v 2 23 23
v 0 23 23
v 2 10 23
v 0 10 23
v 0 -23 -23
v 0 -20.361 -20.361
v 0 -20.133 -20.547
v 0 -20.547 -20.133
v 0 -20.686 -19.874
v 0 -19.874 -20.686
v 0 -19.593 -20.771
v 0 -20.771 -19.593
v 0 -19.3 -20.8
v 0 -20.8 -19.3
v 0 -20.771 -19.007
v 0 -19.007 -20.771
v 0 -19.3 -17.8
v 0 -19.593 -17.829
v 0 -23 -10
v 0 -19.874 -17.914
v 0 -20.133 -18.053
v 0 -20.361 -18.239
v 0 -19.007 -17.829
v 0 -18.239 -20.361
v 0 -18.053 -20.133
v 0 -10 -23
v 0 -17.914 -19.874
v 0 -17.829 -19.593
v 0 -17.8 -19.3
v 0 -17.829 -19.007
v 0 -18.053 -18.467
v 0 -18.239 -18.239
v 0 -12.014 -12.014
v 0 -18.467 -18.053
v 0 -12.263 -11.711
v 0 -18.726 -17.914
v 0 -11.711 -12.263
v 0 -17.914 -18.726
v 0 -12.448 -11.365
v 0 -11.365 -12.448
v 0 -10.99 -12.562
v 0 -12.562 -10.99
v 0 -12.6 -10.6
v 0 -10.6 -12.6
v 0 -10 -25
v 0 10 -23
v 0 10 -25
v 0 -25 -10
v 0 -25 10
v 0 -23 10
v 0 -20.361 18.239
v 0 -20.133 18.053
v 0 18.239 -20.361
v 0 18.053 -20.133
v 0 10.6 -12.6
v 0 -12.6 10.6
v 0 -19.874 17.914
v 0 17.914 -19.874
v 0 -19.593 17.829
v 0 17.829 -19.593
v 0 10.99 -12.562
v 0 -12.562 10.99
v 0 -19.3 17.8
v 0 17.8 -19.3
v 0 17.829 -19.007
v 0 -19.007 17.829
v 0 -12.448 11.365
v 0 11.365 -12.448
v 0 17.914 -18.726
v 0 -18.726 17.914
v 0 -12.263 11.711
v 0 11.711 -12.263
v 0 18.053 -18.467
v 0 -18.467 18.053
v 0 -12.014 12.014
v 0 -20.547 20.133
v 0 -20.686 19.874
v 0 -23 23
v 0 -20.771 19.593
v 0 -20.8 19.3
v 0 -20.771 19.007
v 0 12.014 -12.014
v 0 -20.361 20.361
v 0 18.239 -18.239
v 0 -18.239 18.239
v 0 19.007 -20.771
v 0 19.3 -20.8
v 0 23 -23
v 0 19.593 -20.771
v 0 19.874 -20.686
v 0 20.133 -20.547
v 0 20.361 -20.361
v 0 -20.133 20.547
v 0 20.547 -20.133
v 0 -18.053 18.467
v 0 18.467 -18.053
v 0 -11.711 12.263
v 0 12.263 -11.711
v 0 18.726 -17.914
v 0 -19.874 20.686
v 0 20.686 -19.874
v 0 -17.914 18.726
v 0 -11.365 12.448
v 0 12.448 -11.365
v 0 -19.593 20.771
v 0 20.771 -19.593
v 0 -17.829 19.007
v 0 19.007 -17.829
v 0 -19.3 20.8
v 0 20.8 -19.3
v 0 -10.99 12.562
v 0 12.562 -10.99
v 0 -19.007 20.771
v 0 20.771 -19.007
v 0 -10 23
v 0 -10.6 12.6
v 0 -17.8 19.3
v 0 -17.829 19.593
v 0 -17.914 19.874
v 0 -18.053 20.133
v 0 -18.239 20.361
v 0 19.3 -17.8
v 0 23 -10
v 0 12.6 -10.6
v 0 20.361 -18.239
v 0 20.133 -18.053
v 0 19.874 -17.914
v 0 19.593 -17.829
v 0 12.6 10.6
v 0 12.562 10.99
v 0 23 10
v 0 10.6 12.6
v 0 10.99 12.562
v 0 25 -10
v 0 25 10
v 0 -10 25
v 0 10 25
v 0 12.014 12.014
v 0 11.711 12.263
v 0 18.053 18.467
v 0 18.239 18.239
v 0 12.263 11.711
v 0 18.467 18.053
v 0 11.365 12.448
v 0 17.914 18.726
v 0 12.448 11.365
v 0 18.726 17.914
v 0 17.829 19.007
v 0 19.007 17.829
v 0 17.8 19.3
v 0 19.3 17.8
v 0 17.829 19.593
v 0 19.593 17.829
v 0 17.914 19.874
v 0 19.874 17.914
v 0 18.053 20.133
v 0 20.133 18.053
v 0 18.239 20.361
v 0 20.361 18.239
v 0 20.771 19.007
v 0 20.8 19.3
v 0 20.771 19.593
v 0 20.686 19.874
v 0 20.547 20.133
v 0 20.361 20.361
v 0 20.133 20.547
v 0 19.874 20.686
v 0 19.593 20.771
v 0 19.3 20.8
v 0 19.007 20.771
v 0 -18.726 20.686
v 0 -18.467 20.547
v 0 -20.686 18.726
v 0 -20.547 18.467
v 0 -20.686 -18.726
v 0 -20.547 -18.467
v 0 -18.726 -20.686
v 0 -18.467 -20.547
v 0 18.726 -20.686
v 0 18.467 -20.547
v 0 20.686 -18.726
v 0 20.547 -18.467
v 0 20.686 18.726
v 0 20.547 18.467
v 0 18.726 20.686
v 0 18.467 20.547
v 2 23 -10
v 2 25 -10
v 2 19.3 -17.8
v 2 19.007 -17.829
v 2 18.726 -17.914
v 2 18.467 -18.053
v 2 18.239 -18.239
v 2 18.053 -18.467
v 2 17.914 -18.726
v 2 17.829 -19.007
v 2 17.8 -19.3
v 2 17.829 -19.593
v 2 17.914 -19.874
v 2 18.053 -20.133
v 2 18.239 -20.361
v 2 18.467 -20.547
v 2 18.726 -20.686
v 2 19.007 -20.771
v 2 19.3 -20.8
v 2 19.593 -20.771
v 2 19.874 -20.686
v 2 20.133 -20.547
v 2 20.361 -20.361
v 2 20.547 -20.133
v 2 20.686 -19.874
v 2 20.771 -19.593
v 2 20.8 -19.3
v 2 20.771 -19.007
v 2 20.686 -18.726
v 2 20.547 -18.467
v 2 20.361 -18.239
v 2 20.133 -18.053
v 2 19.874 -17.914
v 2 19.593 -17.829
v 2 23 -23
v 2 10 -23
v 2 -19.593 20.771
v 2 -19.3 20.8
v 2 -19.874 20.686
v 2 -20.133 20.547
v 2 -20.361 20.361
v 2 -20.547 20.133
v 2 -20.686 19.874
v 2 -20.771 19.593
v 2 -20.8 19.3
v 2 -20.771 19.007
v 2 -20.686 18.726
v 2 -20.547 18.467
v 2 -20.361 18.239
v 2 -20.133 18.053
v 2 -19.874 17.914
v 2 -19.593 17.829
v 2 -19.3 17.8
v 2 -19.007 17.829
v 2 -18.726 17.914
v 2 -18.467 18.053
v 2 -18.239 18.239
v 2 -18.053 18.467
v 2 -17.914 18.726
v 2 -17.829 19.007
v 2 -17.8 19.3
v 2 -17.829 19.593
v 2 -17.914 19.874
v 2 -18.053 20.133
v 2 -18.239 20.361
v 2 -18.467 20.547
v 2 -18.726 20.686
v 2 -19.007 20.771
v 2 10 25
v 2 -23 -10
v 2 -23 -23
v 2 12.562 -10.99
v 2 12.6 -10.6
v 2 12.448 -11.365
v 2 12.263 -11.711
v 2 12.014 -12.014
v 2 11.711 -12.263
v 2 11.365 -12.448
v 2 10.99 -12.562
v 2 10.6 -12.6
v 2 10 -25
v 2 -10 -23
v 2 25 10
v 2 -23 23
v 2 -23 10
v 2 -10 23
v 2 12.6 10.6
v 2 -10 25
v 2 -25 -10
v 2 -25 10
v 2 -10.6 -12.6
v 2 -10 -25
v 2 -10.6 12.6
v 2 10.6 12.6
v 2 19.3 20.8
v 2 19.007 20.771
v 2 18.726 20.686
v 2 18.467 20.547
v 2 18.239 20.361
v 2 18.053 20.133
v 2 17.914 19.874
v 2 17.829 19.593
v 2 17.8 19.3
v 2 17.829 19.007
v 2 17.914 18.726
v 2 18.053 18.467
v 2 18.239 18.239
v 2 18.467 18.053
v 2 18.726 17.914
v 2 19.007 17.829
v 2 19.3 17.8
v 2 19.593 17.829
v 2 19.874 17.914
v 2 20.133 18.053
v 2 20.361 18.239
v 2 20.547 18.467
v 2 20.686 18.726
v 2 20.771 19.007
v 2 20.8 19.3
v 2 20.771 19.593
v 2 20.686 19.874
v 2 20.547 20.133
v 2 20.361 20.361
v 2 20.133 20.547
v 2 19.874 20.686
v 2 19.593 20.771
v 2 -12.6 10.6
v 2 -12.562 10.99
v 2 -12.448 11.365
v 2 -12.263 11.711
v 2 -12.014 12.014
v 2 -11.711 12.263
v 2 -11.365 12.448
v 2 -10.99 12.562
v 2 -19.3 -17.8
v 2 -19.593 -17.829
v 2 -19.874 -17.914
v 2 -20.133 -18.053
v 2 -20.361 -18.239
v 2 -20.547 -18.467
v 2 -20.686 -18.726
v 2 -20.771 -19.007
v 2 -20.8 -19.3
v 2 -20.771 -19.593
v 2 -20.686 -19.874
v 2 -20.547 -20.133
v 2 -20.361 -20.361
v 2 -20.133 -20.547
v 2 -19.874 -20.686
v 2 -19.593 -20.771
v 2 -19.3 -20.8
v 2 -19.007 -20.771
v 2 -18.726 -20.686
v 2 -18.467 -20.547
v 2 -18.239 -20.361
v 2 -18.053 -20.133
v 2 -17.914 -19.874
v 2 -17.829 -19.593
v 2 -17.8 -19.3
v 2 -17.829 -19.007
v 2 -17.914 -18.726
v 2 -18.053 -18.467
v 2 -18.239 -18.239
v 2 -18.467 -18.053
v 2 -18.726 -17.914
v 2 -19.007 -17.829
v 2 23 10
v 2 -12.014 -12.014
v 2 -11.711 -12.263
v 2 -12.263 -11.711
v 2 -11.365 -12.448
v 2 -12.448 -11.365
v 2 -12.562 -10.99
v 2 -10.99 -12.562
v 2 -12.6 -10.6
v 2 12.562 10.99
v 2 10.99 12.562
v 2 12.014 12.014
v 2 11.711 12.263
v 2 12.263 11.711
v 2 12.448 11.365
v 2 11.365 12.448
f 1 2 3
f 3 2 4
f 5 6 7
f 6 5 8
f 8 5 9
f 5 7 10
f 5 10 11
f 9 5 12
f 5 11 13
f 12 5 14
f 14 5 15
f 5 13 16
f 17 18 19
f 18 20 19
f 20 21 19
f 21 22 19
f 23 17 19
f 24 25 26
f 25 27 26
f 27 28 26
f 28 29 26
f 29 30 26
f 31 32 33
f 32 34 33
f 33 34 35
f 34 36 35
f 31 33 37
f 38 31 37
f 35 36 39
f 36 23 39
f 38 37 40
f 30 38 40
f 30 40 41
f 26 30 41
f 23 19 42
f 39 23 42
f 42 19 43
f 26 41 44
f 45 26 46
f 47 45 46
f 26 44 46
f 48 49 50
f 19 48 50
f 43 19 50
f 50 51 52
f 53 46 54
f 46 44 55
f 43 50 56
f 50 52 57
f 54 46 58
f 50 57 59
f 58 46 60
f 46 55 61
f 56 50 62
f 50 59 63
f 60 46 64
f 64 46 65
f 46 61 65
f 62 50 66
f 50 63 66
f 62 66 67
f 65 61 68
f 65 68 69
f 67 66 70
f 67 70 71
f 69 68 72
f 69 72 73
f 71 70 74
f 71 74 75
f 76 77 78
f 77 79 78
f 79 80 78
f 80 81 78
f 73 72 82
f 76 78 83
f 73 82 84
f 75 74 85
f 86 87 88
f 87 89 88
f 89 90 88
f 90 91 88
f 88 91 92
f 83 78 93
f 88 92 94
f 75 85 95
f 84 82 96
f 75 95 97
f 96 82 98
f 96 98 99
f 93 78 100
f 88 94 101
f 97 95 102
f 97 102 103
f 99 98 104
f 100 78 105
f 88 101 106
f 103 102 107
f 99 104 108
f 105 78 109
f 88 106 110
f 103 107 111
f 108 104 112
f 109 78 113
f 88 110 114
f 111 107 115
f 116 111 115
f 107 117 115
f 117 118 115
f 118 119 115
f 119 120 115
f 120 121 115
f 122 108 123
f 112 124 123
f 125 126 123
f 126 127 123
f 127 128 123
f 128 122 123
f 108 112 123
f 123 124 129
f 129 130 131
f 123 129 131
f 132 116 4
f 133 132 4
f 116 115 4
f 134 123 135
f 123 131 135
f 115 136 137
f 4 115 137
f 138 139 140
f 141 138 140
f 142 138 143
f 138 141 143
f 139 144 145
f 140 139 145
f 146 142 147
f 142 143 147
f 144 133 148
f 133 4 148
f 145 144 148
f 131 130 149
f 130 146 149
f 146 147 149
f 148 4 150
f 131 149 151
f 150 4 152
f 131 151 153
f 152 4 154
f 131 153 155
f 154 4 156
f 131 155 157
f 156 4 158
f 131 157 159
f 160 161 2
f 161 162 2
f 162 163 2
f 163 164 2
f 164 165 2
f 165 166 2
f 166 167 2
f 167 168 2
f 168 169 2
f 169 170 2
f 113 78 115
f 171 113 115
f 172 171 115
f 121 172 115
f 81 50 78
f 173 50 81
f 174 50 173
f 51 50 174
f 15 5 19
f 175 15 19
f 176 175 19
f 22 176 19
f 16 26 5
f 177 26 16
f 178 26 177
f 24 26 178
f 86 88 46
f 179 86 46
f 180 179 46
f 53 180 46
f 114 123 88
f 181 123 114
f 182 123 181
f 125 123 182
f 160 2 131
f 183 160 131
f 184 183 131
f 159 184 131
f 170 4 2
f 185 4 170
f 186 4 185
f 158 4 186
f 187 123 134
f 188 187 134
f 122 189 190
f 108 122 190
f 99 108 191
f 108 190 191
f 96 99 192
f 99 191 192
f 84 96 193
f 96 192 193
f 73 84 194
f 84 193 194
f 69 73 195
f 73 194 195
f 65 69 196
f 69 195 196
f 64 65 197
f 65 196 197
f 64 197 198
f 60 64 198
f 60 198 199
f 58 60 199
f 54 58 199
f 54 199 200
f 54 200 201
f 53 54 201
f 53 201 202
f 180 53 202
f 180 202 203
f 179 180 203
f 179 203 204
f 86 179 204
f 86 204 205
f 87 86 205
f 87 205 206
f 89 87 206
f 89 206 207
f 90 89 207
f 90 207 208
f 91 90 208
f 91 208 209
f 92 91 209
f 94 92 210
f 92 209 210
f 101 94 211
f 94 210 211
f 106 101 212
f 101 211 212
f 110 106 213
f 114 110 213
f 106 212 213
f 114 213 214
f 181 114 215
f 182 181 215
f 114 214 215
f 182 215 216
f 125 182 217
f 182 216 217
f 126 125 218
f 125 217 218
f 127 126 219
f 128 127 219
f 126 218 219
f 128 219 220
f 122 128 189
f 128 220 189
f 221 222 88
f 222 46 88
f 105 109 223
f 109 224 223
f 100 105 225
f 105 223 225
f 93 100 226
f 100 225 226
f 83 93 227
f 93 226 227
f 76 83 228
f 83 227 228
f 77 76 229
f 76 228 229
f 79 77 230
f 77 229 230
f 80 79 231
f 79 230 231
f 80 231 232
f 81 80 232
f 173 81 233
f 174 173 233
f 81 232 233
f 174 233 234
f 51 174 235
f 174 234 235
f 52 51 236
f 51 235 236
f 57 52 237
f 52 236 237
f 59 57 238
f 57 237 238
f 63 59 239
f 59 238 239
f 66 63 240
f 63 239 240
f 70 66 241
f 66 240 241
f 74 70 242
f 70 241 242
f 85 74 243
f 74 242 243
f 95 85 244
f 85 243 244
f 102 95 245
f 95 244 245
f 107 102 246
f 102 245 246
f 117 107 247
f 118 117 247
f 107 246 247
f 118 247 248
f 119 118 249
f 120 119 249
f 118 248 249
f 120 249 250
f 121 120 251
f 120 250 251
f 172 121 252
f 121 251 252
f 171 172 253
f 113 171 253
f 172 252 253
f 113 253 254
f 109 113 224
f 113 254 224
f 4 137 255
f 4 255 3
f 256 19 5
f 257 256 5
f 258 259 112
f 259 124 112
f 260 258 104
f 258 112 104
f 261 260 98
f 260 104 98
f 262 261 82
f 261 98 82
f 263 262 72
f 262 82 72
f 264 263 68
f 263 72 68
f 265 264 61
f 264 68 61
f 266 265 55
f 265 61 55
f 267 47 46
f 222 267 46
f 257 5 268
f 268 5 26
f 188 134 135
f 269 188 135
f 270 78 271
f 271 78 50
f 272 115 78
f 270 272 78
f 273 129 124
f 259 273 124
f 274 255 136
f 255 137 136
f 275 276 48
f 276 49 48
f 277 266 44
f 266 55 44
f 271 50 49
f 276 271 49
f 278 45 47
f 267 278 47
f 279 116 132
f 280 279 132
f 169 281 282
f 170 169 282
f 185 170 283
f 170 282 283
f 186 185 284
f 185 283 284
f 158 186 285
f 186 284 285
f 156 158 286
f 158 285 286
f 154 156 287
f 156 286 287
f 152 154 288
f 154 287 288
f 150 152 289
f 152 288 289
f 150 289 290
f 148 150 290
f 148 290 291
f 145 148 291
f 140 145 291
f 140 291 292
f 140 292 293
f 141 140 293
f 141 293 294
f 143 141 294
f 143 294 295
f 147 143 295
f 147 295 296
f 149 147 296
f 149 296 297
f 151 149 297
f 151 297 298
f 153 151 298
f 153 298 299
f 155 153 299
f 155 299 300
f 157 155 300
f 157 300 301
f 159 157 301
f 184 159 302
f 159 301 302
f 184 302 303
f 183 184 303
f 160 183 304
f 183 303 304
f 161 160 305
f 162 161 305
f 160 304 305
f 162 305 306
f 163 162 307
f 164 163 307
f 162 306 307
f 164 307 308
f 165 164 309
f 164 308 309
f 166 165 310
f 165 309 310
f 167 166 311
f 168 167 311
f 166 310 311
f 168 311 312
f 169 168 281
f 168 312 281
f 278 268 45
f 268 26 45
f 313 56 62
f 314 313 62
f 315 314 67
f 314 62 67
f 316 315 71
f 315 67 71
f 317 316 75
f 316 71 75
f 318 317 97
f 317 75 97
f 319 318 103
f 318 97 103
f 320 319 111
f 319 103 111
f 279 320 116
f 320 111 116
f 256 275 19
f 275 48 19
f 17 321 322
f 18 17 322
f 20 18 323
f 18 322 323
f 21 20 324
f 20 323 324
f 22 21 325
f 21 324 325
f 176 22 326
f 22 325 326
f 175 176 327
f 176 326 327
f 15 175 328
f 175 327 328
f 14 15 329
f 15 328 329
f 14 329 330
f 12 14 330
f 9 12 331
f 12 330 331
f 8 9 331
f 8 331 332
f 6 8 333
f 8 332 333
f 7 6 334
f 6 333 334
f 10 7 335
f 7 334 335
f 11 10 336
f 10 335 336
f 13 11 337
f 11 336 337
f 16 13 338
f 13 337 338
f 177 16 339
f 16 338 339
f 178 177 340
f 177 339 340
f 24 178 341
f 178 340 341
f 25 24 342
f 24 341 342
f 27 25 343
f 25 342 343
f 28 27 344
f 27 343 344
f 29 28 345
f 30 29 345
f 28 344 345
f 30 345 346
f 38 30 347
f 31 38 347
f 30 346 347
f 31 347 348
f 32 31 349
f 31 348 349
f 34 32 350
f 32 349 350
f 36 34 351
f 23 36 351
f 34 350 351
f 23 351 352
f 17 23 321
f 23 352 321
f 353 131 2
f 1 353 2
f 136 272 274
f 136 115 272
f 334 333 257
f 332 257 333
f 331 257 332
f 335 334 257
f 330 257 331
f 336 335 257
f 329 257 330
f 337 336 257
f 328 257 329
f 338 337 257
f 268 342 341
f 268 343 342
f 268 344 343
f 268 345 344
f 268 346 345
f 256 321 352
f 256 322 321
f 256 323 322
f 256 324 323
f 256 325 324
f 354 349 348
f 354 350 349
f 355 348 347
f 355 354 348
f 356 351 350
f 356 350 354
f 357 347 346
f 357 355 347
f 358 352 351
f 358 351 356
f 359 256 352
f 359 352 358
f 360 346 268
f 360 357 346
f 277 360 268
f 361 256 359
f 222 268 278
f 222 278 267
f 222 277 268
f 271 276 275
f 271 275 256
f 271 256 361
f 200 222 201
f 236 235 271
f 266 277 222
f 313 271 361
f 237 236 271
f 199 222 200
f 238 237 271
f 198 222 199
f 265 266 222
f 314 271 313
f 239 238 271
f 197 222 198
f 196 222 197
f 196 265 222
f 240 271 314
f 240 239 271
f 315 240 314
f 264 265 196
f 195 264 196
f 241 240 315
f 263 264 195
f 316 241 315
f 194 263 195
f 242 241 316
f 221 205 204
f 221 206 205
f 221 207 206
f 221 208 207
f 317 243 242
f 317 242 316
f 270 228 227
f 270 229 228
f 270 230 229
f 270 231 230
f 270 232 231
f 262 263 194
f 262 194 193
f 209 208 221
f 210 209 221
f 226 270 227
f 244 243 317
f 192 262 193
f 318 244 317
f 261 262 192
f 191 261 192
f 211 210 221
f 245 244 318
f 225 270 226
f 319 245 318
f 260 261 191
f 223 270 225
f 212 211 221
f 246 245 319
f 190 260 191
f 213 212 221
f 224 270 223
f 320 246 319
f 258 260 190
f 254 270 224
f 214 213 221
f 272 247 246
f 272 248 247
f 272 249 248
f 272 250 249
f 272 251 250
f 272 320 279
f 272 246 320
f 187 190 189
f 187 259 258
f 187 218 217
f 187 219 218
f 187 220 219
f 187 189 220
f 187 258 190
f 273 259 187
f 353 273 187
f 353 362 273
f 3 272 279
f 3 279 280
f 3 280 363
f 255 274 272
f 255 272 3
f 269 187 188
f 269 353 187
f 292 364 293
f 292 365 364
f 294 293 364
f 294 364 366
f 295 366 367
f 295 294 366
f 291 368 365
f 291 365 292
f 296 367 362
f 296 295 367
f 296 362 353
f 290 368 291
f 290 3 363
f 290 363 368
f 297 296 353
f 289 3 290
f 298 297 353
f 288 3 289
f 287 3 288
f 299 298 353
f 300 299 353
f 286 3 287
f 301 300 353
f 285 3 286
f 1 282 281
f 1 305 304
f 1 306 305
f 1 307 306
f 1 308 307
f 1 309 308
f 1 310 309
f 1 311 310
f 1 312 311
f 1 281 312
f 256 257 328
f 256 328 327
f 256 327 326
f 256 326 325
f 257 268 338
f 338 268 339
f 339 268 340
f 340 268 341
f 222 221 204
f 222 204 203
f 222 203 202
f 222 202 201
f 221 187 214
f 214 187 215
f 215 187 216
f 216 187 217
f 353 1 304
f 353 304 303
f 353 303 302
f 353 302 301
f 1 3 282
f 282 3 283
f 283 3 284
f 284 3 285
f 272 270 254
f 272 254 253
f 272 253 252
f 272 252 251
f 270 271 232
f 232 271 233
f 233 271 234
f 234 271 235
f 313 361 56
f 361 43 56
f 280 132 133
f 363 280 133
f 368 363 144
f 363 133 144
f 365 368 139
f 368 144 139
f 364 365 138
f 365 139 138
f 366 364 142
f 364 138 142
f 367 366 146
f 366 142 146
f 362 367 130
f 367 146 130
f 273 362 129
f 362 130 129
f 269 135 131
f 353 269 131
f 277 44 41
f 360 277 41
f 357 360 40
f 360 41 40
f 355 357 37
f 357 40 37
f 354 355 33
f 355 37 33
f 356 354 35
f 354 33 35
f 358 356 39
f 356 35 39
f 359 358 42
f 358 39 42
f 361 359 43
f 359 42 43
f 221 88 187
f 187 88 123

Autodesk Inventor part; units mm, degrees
ref_plane "YZ Plane" through (0, 0, 0) normal (1, 0, 0) x (0, 1, 0)
ref_plane "XZ Plane" through (0, 0, 0) normal (0, 1, 0) x (-1, 0, 0)
ref_plane "XY Plane" through (0, 0, 0) normal (0, 0, 1) x (1, 0, 0)
sketch "Sketch1" plane through (0, 0, 0) normal (1, 0, 0) x (0, 1, 0)
  line L0 (-25, -25) -> (25, -25)
  line L1 (25, -25) -> (25, 25)
  line L2 (25, 25) -> (-25, 25)
  line L3 (-25, 25) -> (-25, -25)
  line L4 (-25, -25) -> (25, 25) construction
  line L5 (25, -25) -> (-25, 25) construction
  line L6 (-24, -24) -> (24, -24)
  line L7 (24, -24) -> (24, 24)
  line L8 (24, 24) -> (-24, 24)
  line L9 (-24, 24) -> (-24, -24)
  line L10 (-24, -24) -> (24, 24) construction
  line L11 (24, -24) -> (-24, 24) construction
  point P0 (0, 0)
  dimension "d0" = 50
  dimension "d1" = 50
  dimension "d2" = 48
  dimension "d3" = 48
extrude "Extrusion1" add sketch "Sketch1" along normal blind 2 contours L3 L2 L1 L0 | L9 L8 L7 L6
sketch "Sketch3" plane through (0, 0, 0) normal (-1, 0, 0) x (0, 0, 1)
  line L0 (19.3, -19.3) -> (-19.3, -19.3)
  line L1 (-19.3, -19.3) -> (-19.3, 19.3)
  line L2 (-19.3, 19.3) -> (19.3, 19.3)
  line L3 (19.3, 19.3) -> (19.3, -19.3)
  line L4 (19.3, -19.3) -> (-19.3, 19.3) construction
  line L5 (-19.3, -19.3) -> (19.3, 19.3) construction
  circle A0 centre (-19.3, 19.3) radius 1.5
  circle A1 centre (19.3, 19.3) radius 1.5555
  circle A2 centre (19.3, -19.3) radius 1.5555
  circle A3 centre (-19.3, -19.3) radius 1.5555
  point P0 (0, 0)
  dimension "d6" = 38.6
  dimension "d7" = 38.6
  dimension "d8" = 3
  dimension "d9" = 3.111
  dimension "d10" = 3.111
  dimension "d11" = 3.111
hole "Hole1" at (0, 19.3, -19.3) direction (1, 0, 0) diameter 3 end through all
sketch "Sketch4" plane through (0, 0, 0) normal (-1, 0, 0) x (0, 0, 1)
  line L0 (-19.3, -19.3) -> (19.3, -19.3)
  line L1 (19.3, -19.3) -> (19.3, 19.3)
  line L2 (19.3, 19.3) -> (-19.3, 19.3)
  line L3 (-19.3, 19.3) -> (-19.3, -19.3)
  line L4 (-19.3, -19.3) -> (19.3, 19.3) construction
  line L5 (19.3, -19.3) -> (-19.3, 19.3) construction
  circle A0 centre (19.3, 19.3) radius 1.5
  point P0 (0, 0)
  dimension "d19" = 38.6
  dimension "d20" = 38.6
  dimension "d21" = 3
hole "Hole2" at (0, 19.3, 19.3) direction (1, 0, 0) diameter 3 end through all
sketch "Sketch5" plane through (0, 0, 0) normal (-1, 0, 0) x (0, 0, 1)
  line L0 (19.3, -19.3) -> (-19.3, -19.3)
  line L1 (-19.3, -19.3) -> (-19.3, 19.3)
  line L2 (-19.3, 19.3) -> (19.3, 19.3)
  line L3 (19.3, 19.3) -> (19.3, -19.3)
  line L4 (19.3, -19.3) -> (-19.3, 19.3) construction
  line L5 (-19.3, -19.3) -> (19.3, 19.3) construction
  circle A0 centre (-19.3, -19.3) radius 1.5
  point P0 (0, 0)
  dimension "d29" = 38.6
  dimension "d30" = 38.6
  dimension "d31" = 3
hole "Hole3" at (0, -19.3, -19.3) direction (1, 0, 0) diameter 3 end through all
sketch "Sketch6" plane through (0, 0, 0) normal (-1, 0, 0) x (0, 0, 1)
  line L0 (19.3, -19.3) -> (-19.3, -19.3)
  line L1 (-19.3, -19.3) -> (-19.3, 19.3)
  line L2 (-19.3, 19.3) -> (19.3, 19.3)
  line L3 (19.3, 19.3) -> (19.3, -19.3)
  line L4 (19.3, -19.3) -> (-19.3, 19.3) construction
  line L5 (-19.3, -19.3) -> (19.3, 19.3) construction
  circle A0 centre (19.3, -19.3) radius 1.5
  point P0 (0, 0)
  dimension "d39" = 38.6
  dimension "d40" = 38.6
  dimension "d41" = 3
hole "Hole4" at (0, -19.3, 19.3) direction (1, 0, 0) diameter 3 end through all
sketch "Sketch7" plane through (0, 0, 0) normal (-1, 0, 0) x (0, 0, 1)
  line L0 (23, -23) -> (-23, -23)
  line L1 (-23, -23) -> (-23, 23)
  line L2 (-23, 23) -> (23, 23)
  line L3 (23, 23) -> (23, -23)
  line L4 (23, -23) -> (-23, 23) construction
  line L5 (-23, -23) -> (23, 23) construction
  line L6 (-25, 25) -> (25, 25) projected
  line L7 (10, 21) -> (-10, 21)
  line L8 (-10, 21) -> (-10, 25)
  line L9 (-10, 25) -> (10, 25)
  line L10 (10, 25) -> (10, 21)
  line L11 (10, 21) -> (-10, 25) construction
  line L12 (-10, 21) -> (10, 25) construction
  line L13 (21, -10) -> (25, -10)
  line L14 (25, -10) -> (25, 10)
  line L15 (25, 10) -> (21, 10)
  line L16 (21, 10) -> (21, -10)
  line L17 (21, -10) -> (25, 10) construction
  line L18 (25, -10) -> (21, 10) construction
  line L19 (25, -25) -> (-25, -25) projected
  line L20 (-10, -21) -> (10, -21)
  line L21 (10, -21) -> (10, -25)
  line L22 (10, -25) -> (-10, -25)
  line L23 (-10, -25) -> (-10, -21)
  line L24 (-10, -21) -> (10, -25) construction
  line L25 (10, -21) -> (-10, -25) construction
  line L26 (-25.0252, 10) -> (-20.9748, 10)
  line L27 (-20.9748, 10) -> (-20.9748, -10)
  line L28 (-20.9748, -10) -> (-25.0252, -10)
  line L29 (-25.0252, -10) -> (-25.0252, 10)
  line L30 (-25.0252, 10) -> (-20.9748, -10) construction
  line L31 (-20.9748, 10) -> (-25.0252, -10) construction
  line L32 (25, -25) -> (-25, -25)
  line L33 (-25, -25) -> (-25, 25)
  line L34 (-25, 25) -> (25, 25)
  line L35 (25, 25) -> (25, -25)
  line L36 (25, -25) -> (-25, 25) construction
  line L37 (-25, -25) -> (25, 25) construction
  point P0 (0, 0)
  point P1 (0, 23)
  point P2 (23, 0)
  point P3 (0, -23)
  point P4 (-23, 0)
  point P5 (-10, 23)
  point P6 (10, 23)
  point P7 (23, 10)
  point P8 (23, -10)
  point P9 (10, -23)
  point P10 (-10, -23)
  point P11 (-23, -10)
  point P12 (-23, 10)
  point P13 (10, 25)
  point P14 (-25, 10)
  point P15 (-25, -10)
  point P16 (-10, -25)
  dimension "d49" = 46
  dimension "d50" = 46
  dimension "d51" = 20
  dimension "d52" = 20
  dimension "d53" = 20
  dimension "d54" = 20
extrude "Extrusion3" cut sketch "Sketch7" against normal blind 2 contours L3 L13 L35 L19 L21 L0 | L23 L19 L33 L28 L1 L0 | L3 L2 L10 L6 L35 L15 | L26 L33 L6 L8 L2 L1
sketch "Sketch9" plane through (0, 0, 0) normal (-1, 0, 0) x (0, 0, 1)
  line L0 (10.6, 12.6) -> (-10.6, 12.6)
  line L1 (-12.6, 10.6) -> (-12.6, -10.6)
  line L2 (-10.6, -12.6) -> (10.6, -12.6)
  line L3 (12.6, -10.6) -> (12.6, 10.6)
  line L4 (12.6, 12.6) -> (-12.6, -12.6) construction
  line L5 (-12.6, 12.6) -> (12.6, -12.6) construction
  arc A0 (-12.6, -10.6) -> (-10.6, -12.6) centre (-10.6, -10.6) ccw
  arc A1 (-10.6, 12.6) -> (-12.6, 10.6) centre (-10.6, 10.6) ccw
  arc A2 (12.6, 10.6) -> (10.6, 12.6) centre (10.6, 10.6) ccw
  arc A3 (10.6, -12.6) -> (12.6, -10.6) centre (10.6, -10.6) ccw
  point P0 (0, 0)
  dimension "d62" = 25.2
  dimension "d63" = 25.2
  dimension "d64" = 2
extrude "Extrusion4" cut sketch "Sketch9" against normal blind 2
properties part number "BottomSide"
